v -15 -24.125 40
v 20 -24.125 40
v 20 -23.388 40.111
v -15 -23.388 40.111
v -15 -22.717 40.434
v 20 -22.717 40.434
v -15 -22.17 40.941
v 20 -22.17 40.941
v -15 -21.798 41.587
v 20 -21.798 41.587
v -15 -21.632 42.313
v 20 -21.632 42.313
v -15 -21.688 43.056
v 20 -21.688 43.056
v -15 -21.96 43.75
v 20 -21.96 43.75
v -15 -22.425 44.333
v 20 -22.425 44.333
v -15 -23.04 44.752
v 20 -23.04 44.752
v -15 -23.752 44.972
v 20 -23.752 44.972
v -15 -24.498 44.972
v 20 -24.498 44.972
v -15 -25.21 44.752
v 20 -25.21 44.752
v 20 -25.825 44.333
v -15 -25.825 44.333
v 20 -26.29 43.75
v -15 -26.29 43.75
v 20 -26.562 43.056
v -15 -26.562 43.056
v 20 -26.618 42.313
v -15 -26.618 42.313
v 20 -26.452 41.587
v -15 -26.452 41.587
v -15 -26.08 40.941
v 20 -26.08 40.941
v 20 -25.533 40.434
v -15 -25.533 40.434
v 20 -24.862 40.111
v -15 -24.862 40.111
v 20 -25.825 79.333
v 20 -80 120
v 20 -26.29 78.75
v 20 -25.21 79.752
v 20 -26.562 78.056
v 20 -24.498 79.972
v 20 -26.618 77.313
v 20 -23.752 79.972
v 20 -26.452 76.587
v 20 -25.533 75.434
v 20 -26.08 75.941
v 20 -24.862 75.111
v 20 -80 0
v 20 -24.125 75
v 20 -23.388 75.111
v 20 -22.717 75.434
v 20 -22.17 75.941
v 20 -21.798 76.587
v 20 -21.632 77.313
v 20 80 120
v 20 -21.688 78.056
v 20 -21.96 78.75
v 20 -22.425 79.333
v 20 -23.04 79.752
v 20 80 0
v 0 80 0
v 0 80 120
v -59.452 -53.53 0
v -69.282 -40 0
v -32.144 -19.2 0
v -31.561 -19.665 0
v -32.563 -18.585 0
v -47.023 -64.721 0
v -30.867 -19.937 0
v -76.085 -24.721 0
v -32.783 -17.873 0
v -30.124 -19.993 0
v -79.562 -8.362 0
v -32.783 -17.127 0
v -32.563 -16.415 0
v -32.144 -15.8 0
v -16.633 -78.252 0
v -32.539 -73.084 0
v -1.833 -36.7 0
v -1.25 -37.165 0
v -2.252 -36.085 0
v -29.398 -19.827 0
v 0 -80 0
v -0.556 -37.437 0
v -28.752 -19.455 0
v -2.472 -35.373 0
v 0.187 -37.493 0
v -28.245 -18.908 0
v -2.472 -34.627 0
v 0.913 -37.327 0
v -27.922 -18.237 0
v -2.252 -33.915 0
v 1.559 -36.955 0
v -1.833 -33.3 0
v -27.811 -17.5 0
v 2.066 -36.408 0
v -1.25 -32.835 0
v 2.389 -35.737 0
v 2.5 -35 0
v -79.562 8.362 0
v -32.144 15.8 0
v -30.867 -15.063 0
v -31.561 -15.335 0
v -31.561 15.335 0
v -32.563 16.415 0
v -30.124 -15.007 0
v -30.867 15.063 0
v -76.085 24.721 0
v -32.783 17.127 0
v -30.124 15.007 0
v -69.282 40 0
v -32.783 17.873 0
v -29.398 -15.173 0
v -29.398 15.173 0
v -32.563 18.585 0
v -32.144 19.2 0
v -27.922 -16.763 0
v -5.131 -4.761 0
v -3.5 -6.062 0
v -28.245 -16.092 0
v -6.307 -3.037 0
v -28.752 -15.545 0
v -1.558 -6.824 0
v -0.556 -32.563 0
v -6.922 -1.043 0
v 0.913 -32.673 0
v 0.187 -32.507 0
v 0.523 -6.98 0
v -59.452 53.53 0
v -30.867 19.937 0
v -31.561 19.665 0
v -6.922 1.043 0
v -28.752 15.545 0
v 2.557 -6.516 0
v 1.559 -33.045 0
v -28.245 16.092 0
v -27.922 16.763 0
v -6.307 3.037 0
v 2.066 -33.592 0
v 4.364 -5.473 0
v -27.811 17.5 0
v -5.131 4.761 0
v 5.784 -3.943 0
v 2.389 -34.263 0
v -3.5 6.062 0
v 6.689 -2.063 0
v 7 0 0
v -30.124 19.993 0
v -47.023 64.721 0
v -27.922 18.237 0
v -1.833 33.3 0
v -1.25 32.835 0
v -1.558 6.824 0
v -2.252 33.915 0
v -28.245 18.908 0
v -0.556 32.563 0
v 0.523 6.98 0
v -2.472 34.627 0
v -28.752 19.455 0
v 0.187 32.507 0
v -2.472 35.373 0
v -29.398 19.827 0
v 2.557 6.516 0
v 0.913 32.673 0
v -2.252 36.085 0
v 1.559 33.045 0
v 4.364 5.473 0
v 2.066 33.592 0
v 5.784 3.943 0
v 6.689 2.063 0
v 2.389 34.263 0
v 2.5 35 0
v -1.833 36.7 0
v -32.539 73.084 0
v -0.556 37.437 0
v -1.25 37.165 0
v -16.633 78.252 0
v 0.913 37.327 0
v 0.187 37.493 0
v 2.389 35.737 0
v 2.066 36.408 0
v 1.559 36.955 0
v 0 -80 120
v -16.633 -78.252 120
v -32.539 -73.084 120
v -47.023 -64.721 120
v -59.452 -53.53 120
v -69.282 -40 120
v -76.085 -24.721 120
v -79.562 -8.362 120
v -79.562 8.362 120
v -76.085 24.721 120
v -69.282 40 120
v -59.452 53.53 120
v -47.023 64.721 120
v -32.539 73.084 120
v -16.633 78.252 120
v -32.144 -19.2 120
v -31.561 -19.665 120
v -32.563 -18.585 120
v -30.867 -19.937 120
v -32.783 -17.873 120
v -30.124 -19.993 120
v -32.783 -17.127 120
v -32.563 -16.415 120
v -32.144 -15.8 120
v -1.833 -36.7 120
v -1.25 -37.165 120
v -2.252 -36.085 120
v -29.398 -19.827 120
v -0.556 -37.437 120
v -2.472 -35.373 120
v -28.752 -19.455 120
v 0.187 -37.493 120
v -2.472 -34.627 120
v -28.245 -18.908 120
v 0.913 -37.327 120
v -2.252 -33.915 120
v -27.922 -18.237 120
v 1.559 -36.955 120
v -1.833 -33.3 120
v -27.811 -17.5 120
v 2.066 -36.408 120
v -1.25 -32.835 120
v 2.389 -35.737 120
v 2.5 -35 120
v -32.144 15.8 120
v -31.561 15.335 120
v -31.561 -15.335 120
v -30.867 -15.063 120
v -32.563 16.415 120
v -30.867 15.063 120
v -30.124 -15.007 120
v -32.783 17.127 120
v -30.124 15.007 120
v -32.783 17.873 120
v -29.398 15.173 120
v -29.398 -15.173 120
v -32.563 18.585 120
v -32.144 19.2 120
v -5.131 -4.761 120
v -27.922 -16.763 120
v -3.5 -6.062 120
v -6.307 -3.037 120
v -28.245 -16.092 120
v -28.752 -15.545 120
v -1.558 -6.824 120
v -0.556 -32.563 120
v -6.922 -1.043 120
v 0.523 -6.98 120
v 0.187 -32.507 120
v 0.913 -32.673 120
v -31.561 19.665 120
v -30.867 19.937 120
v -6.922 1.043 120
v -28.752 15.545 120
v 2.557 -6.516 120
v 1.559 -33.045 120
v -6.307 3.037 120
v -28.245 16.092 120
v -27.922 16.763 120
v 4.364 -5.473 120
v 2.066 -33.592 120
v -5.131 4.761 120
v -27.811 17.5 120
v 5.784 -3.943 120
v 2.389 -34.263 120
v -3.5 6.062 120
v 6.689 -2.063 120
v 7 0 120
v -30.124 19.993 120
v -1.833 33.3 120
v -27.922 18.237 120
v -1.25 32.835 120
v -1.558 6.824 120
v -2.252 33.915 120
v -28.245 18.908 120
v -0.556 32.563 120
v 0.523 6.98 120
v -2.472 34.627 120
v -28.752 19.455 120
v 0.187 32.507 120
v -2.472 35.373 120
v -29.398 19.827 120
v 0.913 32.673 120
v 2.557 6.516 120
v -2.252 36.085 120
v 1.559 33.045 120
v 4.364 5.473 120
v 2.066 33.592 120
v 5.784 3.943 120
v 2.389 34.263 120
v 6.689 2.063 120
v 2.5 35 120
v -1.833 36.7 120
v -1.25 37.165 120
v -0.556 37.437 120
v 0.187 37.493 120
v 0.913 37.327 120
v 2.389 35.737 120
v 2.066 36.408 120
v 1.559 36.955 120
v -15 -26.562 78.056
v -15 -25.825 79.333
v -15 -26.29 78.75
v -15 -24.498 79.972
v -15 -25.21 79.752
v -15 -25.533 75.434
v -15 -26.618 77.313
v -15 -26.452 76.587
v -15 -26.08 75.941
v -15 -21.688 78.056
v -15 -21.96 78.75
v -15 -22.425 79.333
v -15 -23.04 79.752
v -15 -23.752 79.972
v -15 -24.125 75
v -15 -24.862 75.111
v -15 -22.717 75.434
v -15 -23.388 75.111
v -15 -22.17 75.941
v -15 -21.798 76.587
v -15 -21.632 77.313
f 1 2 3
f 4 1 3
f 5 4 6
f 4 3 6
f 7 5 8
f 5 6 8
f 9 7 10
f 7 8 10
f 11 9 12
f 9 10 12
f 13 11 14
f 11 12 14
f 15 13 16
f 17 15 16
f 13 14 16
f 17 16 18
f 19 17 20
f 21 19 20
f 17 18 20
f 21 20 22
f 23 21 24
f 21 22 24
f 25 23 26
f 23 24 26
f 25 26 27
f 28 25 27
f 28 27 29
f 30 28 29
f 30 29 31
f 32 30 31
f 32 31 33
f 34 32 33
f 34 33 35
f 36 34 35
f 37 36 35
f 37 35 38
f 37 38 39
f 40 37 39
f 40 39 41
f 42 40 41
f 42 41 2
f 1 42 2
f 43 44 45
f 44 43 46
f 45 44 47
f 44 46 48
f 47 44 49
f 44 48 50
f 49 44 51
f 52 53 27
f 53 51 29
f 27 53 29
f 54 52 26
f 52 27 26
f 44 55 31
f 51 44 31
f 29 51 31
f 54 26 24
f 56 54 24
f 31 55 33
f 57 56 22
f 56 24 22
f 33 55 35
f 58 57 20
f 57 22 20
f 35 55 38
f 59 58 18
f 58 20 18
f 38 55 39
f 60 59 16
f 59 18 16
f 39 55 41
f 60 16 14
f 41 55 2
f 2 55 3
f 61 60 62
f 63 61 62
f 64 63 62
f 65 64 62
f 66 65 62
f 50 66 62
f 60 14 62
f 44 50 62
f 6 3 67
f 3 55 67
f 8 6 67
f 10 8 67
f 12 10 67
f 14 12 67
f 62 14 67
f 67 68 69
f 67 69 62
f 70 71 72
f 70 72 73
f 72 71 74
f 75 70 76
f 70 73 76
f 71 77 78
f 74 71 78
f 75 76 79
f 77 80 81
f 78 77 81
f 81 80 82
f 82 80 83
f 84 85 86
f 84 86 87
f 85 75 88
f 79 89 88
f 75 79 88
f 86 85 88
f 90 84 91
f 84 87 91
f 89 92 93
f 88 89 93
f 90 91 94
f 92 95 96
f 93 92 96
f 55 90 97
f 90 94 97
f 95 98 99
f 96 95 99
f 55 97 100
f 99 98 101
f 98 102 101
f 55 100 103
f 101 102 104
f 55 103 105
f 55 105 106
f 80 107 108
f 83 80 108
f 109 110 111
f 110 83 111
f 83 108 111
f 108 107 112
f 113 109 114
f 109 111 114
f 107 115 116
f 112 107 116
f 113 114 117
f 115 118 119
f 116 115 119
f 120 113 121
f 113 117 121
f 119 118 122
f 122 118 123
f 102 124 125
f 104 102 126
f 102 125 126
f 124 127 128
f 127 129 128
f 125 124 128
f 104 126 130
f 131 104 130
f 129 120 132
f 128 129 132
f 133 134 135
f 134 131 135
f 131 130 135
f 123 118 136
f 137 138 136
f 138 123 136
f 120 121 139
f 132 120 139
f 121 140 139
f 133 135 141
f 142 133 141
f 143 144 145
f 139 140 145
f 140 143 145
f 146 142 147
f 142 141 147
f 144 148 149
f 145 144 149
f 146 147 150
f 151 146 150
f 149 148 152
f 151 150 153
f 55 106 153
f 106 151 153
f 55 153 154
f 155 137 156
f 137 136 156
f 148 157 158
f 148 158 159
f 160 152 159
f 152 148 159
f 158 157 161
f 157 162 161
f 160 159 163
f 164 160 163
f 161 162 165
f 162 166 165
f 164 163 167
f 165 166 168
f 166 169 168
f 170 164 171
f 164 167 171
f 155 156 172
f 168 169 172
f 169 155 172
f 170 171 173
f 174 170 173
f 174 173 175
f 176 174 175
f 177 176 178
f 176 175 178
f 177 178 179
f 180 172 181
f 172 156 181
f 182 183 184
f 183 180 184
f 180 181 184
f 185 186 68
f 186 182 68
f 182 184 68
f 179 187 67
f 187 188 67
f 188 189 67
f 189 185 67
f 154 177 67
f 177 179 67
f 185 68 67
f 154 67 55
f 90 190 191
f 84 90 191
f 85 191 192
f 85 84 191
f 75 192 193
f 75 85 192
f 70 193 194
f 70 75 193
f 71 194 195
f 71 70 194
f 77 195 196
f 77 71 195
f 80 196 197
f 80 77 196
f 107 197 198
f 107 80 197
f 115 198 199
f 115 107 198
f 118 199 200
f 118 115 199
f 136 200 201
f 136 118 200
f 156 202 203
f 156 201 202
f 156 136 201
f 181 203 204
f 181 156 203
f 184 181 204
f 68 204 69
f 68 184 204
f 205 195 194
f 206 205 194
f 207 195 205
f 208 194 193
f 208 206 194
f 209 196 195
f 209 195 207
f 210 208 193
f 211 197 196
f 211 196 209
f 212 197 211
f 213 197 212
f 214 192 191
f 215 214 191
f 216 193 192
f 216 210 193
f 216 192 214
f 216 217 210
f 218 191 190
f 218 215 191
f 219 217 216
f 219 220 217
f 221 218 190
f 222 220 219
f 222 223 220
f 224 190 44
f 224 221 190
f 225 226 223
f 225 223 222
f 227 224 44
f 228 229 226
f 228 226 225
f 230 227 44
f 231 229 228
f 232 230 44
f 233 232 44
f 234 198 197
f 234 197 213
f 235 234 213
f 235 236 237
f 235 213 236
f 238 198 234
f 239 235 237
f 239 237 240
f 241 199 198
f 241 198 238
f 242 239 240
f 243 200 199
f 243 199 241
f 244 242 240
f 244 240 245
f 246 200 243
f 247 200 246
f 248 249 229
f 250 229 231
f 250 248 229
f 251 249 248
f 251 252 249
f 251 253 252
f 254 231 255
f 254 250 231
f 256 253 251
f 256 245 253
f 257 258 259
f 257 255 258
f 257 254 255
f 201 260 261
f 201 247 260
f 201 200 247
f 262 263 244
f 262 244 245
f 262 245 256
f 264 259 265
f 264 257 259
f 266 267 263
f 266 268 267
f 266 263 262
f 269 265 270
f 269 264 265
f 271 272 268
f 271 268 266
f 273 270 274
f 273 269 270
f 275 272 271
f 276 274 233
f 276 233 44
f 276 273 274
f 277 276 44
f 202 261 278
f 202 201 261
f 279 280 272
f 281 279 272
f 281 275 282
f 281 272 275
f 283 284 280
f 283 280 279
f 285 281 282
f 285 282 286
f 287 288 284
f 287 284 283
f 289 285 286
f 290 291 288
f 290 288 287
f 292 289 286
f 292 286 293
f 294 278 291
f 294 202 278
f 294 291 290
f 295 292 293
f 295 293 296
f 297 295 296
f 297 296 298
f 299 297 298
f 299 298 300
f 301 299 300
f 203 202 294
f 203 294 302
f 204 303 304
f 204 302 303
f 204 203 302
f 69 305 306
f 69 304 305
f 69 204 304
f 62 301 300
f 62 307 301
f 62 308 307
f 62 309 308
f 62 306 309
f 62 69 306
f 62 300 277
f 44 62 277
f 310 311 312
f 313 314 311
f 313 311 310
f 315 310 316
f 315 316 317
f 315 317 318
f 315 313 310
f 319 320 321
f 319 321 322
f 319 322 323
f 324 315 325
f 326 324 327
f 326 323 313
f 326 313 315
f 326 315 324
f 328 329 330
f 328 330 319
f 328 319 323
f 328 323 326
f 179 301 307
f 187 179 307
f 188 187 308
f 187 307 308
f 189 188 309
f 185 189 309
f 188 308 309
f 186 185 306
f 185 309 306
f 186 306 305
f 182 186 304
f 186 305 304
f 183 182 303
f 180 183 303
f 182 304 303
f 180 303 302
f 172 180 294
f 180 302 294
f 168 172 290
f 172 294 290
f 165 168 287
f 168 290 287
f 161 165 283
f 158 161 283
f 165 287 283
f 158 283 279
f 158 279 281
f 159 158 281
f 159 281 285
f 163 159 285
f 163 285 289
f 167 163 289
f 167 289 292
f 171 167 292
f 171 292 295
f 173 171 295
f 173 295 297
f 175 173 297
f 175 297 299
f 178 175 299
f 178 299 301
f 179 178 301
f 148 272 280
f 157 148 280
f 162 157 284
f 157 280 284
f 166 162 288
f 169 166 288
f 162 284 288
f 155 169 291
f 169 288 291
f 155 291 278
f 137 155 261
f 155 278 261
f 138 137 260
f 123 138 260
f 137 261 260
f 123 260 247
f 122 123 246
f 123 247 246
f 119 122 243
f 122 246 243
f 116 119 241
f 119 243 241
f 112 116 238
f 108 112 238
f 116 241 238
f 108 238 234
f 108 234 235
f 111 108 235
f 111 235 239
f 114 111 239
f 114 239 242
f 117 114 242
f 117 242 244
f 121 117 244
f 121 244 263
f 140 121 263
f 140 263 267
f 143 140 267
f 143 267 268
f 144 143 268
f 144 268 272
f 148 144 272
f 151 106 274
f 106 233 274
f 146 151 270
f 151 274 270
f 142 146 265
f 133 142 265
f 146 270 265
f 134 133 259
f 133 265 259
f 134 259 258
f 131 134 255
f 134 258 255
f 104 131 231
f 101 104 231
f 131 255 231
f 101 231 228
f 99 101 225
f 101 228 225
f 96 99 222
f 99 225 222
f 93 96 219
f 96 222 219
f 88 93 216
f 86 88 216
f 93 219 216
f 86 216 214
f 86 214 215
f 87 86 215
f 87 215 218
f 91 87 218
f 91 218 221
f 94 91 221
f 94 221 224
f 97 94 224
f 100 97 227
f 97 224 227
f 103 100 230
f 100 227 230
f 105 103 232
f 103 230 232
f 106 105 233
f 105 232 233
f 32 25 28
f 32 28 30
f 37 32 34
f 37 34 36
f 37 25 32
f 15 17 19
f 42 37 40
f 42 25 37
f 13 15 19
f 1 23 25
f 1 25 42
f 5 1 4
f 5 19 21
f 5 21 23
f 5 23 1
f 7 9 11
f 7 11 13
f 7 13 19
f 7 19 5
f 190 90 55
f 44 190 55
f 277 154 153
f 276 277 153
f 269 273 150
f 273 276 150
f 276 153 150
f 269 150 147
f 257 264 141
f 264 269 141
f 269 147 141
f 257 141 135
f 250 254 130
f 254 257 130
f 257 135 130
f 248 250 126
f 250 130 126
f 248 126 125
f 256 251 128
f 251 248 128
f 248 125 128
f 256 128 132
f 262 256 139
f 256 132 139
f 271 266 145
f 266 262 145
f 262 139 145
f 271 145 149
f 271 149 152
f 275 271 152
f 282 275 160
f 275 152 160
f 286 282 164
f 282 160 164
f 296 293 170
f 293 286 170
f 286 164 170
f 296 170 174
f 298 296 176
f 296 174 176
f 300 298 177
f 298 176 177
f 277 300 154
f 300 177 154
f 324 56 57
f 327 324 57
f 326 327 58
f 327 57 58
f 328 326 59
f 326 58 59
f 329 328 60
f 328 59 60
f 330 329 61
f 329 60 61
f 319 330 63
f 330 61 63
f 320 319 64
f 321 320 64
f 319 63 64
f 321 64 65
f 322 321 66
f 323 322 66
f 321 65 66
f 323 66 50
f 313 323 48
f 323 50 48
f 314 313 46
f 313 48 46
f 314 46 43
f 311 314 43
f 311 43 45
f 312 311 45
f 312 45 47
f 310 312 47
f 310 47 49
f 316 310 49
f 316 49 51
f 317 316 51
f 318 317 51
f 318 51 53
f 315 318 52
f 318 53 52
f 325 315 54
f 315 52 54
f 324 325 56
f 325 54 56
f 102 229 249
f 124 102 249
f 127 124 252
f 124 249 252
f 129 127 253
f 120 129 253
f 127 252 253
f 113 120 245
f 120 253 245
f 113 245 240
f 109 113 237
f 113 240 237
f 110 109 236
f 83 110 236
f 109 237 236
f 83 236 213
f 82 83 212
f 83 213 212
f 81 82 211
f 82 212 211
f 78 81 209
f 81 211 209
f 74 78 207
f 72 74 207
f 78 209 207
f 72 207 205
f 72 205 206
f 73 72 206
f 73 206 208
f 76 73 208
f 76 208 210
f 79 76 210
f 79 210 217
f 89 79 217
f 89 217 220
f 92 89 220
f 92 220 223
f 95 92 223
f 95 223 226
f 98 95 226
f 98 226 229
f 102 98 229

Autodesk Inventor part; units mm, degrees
ref_plane "YZ Plane" through (0, 0, 0) normal (1, 0, 0) x (0, 1, 0)
ref_plane "XZ Plane" through (0, 0, 0) normal (0, 1, 0) x (-1, 0, 0)
ref_plane "XY Plane" through (0, 0, 0) normal (0, 0, 1) x (1, 0, 0)
sketch "Sketch1" plane through (0, 0, 0) normal (0, 0, 1) x (1, 0, 0)
  circle A0 centre (0, 0) radius 80 construction
  line L0 (0, 80) -> (20, 80)
  line L1 (0, -80) -> (20, -80)
  line L2 (20, -80) -> (20, 80)
  arc A1 (0, 80) -> (0, -80) centre (0, 0) ccw
  circle A2 centre (0, 0) radius 7
  dimension "d0" = 160
  dimension "d1" = 20
  dimension "d3" = 14
extrude "Extrusion1" add sketch "Sketch1" along normal blind 120
sketch "Sketch2" plane through (20, -80, 0) normal (1, 0, 0) x (0, 0, -1)
  line L0 (-120, 160) -> (-120, 0) projected
  line L1 (-120, 55.875) -> (0, 55.875) construction
  line L2 (0, 0) -> (0, 160) projected
  line L3 (-120, 0) -> (-120, 160) projected
  circle A0 centre (-42.5, 55.875) radius 2.5
  circle A1 centre (-77.5, 55.875) radius 2.5
  point P0 (0, 80)
  dimension "d6" = 24.125
  dimension "d7" = 5
  dimension "d8" = 5
  dimension "d9" = 42.5
  dimension "d10" = 35
extrude "Extrusion2" cut sketch "Sketch2" against normal blind 35
sketch "Sketch3" plane through (0, 0, 120) normal (0, 0, 1) x (1, 0, 0)
  circle A0 centre (0, 35) radius 2.5
  circle A1 centre (-30.3109, 17.5) radius 2.5
  circle A2 centre (-30.3109, -17.5) radius 2.5
  circle A3 centre (0, -35) radius 2.5
  circle A4 centre (30.3109, -17.5) radius 2.5
  circle A5 centre (30.3109, 17.5) radius 2.5
  point P0 (0, 0)
  dimension "d14" = 5
  dimension "d15" = 35
  dimension "d18" = 360
extrude "Extrusion3" cut sketch "Sketch3" against normal through all
properties part number "AA004" material "ABS Plastic"
